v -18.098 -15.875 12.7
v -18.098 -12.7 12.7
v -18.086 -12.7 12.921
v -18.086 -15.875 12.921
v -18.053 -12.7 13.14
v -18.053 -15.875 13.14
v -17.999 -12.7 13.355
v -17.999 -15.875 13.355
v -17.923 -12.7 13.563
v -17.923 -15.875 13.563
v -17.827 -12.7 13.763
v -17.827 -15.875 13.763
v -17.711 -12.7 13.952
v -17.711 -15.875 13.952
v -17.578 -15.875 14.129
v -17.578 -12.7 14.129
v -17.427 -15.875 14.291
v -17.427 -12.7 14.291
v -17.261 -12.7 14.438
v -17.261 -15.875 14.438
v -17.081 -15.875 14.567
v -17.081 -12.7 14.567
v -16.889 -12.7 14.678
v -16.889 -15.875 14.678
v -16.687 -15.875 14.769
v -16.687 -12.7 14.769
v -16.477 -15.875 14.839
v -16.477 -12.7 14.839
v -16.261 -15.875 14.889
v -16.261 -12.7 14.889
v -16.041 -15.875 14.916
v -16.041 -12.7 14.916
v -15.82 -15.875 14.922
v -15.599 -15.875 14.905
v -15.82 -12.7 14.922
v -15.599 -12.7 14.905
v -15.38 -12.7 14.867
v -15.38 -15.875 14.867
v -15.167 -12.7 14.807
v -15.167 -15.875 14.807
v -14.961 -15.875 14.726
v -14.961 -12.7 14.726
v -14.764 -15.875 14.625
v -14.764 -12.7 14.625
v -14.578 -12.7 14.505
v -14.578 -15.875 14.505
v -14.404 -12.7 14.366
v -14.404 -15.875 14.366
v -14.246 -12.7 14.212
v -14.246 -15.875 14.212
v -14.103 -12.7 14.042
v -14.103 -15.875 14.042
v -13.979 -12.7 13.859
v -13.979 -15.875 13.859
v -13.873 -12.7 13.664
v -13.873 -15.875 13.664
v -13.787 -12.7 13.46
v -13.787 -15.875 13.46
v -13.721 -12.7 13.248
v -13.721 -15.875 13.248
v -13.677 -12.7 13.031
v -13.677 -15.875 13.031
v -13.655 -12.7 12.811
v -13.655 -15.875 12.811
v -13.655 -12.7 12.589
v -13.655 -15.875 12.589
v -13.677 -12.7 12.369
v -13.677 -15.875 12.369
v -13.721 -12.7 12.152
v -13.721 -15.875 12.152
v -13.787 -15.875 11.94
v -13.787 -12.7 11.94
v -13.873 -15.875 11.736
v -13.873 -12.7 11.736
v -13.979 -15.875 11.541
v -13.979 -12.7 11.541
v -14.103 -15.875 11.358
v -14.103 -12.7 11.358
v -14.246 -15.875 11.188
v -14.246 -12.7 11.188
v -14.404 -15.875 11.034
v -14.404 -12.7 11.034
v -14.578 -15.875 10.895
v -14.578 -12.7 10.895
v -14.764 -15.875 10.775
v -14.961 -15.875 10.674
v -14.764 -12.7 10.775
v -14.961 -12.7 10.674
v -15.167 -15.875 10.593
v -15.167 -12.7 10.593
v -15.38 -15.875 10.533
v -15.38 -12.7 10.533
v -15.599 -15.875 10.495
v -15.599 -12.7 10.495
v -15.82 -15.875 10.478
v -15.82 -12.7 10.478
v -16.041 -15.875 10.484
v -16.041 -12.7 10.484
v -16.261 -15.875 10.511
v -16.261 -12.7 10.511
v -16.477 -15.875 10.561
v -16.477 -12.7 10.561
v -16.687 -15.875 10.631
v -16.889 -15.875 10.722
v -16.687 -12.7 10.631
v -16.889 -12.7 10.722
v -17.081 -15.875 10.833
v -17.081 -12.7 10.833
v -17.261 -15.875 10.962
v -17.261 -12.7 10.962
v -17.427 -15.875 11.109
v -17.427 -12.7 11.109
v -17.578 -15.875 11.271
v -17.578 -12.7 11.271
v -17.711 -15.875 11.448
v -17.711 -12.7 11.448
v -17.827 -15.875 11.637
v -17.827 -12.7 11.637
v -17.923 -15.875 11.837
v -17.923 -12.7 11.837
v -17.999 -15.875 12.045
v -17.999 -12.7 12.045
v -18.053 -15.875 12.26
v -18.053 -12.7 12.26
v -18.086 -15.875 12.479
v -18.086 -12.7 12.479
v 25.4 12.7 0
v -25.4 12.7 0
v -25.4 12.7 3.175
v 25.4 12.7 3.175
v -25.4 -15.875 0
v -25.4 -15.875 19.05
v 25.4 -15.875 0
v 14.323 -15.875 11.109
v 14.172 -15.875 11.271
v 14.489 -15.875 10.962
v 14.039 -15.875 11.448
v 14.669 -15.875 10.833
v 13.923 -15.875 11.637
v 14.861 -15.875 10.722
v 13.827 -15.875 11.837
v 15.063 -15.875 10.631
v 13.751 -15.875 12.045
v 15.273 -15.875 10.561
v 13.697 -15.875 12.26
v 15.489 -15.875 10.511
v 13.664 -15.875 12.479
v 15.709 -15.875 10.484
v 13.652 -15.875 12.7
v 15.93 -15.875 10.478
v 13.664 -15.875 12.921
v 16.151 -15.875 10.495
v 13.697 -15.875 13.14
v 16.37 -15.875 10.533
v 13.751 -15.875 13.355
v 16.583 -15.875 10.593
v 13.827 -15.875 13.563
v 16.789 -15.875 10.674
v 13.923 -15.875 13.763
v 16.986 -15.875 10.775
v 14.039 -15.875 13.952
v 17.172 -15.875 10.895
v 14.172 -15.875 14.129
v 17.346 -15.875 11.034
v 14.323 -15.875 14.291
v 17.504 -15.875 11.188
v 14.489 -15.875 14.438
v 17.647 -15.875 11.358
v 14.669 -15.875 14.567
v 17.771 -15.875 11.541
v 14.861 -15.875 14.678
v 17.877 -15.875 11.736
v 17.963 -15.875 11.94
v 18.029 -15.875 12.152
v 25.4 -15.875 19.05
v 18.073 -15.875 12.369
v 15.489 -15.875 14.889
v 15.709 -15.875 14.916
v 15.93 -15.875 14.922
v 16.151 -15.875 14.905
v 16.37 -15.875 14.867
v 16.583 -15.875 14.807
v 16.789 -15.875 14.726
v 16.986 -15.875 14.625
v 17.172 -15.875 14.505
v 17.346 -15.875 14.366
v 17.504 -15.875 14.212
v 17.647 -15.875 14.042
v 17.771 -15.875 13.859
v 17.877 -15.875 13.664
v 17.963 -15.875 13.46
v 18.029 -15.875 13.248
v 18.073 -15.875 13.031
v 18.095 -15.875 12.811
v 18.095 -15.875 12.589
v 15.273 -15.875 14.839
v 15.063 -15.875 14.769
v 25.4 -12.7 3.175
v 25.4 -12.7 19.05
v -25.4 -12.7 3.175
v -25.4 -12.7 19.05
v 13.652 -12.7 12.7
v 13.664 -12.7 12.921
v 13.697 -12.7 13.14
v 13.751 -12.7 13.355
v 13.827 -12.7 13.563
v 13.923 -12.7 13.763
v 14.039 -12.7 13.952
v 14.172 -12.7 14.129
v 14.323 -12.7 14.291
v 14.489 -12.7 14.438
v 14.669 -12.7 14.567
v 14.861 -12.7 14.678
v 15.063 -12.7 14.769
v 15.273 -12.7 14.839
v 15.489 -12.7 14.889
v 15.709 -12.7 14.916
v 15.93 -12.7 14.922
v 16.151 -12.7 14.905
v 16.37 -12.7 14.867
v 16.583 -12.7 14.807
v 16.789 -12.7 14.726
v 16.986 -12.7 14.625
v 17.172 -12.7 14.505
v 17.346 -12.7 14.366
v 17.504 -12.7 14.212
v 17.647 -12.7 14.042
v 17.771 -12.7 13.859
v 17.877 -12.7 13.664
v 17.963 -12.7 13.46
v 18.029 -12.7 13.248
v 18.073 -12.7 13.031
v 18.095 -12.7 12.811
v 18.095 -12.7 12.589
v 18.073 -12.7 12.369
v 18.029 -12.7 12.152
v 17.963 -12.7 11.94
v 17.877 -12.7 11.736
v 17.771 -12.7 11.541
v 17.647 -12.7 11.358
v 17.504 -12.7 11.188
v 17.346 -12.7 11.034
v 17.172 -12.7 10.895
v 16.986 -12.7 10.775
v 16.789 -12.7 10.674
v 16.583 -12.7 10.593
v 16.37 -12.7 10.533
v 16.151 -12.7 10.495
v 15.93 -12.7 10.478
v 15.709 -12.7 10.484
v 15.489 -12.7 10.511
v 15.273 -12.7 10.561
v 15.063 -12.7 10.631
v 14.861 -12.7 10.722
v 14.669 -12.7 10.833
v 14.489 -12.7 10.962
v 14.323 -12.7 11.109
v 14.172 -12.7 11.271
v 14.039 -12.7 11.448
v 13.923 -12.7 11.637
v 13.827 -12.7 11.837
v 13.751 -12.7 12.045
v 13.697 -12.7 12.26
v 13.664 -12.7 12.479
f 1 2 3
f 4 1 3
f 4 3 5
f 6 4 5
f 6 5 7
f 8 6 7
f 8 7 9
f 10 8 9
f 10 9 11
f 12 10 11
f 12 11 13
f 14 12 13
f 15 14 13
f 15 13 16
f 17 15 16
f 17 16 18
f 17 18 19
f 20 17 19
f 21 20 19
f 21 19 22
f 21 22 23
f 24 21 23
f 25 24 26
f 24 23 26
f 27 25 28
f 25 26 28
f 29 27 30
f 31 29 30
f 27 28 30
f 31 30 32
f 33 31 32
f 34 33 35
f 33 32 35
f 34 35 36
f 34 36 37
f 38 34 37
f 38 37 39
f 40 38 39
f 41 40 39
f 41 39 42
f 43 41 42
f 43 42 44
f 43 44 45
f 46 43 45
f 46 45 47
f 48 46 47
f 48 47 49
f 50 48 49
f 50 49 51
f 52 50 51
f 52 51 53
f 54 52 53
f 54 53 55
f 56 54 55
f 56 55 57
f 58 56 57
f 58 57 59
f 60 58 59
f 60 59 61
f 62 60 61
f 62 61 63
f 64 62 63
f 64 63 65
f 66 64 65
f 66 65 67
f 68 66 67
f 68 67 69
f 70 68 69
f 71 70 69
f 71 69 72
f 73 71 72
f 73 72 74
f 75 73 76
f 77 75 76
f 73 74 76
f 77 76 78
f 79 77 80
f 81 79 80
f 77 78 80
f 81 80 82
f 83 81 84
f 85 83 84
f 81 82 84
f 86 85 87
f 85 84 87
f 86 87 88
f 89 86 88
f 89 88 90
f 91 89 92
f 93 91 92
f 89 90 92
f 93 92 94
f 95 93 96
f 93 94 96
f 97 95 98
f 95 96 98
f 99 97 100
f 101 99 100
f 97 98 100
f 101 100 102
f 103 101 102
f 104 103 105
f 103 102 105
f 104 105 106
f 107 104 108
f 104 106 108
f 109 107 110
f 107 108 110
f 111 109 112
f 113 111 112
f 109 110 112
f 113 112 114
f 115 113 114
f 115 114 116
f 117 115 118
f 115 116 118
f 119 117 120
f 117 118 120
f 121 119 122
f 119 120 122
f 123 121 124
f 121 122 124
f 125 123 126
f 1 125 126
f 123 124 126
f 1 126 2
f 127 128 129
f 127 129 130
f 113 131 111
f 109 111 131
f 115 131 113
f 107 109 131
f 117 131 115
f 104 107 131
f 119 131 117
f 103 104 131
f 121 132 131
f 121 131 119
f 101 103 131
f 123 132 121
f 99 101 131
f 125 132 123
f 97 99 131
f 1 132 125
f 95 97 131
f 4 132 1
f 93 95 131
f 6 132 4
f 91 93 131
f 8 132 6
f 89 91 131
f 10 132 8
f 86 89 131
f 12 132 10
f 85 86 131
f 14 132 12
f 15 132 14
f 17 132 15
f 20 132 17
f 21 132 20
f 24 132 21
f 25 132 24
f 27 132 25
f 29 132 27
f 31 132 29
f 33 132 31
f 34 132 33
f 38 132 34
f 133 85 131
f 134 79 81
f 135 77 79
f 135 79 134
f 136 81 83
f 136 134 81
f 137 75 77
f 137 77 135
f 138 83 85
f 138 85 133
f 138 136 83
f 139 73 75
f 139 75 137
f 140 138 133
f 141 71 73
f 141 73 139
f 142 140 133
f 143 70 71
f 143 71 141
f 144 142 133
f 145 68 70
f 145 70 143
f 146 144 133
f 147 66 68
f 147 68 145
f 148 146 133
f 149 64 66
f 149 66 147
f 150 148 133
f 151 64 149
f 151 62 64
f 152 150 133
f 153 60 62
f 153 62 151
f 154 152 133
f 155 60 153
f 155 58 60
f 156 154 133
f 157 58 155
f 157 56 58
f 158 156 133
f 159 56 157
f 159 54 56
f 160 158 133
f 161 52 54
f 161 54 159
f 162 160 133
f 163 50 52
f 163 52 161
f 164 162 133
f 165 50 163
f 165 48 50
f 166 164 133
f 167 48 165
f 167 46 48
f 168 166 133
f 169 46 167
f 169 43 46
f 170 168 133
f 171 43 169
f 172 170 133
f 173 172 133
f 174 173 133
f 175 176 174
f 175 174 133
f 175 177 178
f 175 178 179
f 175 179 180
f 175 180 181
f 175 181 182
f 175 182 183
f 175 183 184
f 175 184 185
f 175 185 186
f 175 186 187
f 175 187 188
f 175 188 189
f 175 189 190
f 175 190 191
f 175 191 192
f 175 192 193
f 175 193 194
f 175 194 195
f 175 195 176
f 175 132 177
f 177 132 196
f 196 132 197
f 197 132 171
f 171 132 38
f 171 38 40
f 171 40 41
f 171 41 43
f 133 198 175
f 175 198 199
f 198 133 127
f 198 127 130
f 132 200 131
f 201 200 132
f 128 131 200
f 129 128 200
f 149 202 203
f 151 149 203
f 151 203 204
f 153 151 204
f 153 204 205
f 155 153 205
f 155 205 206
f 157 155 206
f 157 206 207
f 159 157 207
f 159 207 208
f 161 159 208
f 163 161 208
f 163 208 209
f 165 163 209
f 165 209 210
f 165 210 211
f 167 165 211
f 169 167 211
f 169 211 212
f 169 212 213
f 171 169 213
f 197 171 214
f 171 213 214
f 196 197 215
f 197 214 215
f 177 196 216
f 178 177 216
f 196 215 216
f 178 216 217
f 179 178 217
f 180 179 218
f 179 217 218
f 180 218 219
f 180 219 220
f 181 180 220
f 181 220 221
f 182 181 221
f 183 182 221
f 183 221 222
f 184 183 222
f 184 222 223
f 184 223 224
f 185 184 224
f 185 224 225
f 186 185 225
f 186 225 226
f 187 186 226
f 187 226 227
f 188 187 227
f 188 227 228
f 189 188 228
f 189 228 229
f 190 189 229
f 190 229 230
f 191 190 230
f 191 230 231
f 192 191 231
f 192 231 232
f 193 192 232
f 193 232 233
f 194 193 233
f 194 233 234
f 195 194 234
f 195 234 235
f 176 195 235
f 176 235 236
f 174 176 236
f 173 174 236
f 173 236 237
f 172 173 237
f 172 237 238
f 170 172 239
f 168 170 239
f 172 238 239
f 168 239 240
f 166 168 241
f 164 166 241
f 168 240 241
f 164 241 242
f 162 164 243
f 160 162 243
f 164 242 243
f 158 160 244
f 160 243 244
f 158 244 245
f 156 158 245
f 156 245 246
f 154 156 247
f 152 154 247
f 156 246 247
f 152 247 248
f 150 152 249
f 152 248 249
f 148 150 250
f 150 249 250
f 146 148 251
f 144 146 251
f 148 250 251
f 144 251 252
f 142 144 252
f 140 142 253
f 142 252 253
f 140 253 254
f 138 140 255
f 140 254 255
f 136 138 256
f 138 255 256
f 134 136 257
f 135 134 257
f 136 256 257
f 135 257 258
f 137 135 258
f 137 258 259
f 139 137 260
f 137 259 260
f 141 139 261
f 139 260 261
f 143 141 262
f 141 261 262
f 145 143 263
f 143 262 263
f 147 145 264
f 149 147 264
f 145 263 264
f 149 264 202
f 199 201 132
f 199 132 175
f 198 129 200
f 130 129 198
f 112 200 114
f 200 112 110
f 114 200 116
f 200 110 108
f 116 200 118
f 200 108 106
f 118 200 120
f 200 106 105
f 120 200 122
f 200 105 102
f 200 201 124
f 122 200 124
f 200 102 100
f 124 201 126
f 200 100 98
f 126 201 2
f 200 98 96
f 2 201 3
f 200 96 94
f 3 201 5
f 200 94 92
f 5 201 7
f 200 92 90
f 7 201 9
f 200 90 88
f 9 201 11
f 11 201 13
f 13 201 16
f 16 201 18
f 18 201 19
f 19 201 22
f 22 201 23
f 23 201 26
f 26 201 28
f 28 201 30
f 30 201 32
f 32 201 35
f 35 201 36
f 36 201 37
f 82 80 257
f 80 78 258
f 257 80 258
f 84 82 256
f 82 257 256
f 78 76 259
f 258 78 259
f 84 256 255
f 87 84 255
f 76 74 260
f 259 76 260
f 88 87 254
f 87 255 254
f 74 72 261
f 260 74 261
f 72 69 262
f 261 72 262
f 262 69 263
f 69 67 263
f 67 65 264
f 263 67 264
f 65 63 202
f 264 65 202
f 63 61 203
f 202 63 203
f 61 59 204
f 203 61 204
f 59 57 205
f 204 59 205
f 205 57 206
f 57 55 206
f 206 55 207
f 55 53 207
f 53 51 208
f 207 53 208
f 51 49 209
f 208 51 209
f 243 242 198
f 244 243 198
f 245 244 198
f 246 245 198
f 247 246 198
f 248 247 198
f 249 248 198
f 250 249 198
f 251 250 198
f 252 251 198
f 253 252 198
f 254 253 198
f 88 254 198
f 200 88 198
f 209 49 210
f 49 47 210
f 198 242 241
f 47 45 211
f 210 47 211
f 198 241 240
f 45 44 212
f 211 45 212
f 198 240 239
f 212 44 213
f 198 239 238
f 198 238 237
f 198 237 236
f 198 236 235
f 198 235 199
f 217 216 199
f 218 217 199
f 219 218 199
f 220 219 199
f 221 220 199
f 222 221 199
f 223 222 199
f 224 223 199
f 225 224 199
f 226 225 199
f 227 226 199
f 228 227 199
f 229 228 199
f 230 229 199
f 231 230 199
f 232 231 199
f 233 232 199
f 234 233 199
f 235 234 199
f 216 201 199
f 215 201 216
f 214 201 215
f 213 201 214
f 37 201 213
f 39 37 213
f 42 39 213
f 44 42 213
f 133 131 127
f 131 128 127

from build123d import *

# Parameters (mm, degrees)
F0_W     = 50.8
F0_H     = 25.4
F1_DEPTH = 3.175
F2_W     = 50.8
F2_H     = 19.05
F3_DEPTH = 3.175
F6_D     = 4.445
F8_D     = 4.445


with BuildPart() as f1:
    # F0 (on Top) → F1 (new body)
    with BuildSketch(Plane.XY):
        Rectangle(F0_W, F0_H)
    extrude(amount=F1_DEPTH)

    # F2 (on face) → F3 (join)
    with BuildSketch(Plane.XZ.offset(12.7)):
        with Locations((0, 9.525)):
            Rectangle(F2_W, F2_H)
    extrude(amount=F3_DEPTH)

    # F6 (through all)
    with Locations(Plane.XZ.offset(15.875)):
        with Locations((15.875, 12.7)):
            Hole(F6_D / 2)

    # F8 (through all)
    with Locations(Plane.XZ.offset(15.875)):
        with Locations((-15.875, 12.7)):
            Hole(F8_D / 2)


solid = f1.part
